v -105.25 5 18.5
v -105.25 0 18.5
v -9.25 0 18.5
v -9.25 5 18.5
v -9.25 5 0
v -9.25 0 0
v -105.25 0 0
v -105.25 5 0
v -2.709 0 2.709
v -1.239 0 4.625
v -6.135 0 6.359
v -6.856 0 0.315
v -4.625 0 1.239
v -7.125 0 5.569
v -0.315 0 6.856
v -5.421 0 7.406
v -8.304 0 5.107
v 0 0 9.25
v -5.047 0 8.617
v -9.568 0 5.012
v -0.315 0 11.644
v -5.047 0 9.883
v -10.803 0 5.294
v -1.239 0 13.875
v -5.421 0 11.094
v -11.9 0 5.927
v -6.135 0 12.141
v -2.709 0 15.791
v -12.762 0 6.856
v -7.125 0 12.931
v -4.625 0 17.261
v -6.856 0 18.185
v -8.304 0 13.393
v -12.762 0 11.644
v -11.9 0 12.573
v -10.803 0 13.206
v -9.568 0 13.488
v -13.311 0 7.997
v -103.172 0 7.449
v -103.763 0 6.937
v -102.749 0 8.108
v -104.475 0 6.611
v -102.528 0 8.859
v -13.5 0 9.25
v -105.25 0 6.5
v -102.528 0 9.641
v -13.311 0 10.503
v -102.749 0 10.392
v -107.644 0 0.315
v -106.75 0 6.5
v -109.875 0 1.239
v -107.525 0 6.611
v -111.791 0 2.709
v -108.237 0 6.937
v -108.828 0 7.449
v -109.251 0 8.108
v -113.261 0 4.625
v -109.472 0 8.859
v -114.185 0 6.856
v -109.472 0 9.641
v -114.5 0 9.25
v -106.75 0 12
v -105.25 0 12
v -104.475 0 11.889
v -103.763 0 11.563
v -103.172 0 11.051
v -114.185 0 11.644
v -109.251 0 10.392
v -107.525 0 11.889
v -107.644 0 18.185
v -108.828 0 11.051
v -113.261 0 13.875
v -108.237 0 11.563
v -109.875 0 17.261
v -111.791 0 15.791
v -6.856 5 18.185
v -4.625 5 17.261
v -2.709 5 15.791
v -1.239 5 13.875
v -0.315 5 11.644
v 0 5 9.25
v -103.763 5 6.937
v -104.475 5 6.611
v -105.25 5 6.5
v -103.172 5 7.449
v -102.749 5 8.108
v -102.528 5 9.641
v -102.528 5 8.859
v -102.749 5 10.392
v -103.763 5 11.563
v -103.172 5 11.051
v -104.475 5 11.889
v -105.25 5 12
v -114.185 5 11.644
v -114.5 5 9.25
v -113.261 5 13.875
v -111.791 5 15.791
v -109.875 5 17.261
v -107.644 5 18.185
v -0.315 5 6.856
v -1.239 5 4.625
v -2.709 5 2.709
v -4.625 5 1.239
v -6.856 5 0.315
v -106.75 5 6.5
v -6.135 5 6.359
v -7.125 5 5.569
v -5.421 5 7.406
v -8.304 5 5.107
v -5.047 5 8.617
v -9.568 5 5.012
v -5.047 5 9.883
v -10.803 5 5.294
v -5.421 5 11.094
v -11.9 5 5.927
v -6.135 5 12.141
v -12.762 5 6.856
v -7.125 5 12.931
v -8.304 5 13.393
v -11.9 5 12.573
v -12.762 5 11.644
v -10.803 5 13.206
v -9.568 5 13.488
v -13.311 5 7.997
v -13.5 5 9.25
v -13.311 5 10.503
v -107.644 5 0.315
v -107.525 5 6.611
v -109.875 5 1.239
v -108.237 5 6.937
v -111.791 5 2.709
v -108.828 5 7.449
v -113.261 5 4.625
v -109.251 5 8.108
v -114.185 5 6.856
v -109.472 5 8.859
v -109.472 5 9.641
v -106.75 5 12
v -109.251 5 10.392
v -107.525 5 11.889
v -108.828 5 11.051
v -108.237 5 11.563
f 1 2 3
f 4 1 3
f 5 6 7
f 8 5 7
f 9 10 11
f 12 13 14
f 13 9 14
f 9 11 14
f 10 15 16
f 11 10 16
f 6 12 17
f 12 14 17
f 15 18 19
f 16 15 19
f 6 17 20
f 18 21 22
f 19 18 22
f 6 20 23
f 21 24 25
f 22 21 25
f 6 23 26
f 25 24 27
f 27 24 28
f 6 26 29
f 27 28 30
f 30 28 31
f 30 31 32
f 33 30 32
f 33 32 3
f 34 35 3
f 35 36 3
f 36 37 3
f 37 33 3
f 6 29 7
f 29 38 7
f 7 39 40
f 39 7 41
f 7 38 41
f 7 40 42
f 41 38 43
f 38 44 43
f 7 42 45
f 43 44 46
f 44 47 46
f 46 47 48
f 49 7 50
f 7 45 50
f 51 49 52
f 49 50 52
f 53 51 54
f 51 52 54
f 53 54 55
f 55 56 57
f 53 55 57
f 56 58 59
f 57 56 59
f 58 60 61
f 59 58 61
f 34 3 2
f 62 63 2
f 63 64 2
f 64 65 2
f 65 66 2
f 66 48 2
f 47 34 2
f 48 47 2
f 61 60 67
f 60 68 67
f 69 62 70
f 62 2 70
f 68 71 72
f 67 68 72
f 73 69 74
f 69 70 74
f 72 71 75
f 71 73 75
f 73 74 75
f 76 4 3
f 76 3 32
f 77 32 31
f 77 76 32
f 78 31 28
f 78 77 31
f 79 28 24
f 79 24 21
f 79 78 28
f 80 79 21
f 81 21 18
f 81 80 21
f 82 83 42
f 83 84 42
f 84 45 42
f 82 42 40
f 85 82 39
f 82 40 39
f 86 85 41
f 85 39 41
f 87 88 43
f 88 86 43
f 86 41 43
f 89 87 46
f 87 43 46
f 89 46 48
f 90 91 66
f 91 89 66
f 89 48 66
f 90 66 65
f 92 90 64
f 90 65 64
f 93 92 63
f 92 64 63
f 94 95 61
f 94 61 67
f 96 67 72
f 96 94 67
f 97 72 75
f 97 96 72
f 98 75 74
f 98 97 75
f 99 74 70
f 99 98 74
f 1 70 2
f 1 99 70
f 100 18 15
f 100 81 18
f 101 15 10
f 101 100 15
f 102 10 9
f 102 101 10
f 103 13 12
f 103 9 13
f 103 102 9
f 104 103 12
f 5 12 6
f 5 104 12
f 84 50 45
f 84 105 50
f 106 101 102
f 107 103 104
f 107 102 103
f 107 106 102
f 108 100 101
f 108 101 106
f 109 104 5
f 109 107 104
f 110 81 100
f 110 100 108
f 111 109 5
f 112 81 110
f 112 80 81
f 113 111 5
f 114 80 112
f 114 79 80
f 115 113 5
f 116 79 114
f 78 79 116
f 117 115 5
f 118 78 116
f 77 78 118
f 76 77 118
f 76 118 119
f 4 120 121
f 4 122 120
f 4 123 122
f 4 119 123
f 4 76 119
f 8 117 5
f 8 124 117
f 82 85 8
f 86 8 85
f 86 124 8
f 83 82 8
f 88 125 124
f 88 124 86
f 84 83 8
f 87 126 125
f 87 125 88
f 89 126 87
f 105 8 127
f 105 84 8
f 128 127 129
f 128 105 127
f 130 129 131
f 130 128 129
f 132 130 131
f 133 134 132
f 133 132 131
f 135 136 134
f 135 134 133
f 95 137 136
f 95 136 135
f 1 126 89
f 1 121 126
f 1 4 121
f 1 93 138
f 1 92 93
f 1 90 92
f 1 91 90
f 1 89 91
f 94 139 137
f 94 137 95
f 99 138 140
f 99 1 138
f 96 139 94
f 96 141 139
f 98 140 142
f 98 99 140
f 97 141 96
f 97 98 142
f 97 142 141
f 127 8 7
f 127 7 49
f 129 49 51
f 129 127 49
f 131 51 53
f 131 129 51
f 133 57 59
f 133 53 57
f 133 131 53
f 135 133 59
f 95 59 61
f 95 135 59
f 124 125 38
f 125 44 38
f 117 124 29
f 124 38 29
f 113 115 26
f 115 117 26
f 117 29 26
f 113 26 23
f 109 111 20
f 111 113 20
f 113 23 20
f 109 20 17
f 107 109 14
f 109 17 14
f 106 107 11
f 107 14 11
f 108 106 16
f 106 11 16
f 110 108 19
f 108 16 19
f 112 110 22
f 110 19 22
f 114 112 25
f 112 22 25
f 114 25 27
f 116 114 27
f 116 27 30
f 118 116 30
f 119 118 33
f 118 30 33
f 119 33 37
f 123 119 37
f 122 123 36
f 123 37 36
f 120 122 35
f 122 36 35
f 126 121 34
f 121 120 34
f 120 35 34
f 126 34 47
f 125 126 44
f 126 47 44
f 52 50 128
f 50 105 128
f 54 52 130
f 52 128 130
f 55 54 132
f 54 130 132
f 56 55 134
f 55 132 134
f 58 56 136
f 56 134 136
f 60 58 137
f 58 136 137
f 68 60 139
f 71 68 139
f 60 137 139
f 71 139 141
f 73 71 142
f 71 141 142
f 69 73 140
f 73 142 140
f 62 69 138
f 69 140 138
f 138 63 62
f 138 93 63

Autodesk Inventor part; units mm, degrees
ref_plane "YZ Plane" through (0, 0, 0) normal (1, 0, 0) x (0, 1, 0)
ref_plane "XZ Plane" through (0, 0, 0) normal (0, 1, 0) x (-1, 0, 0)
ref_plane "XY Plane" through (0, 0, 0) normal (0, 0, 1) x (1, 0, 0)
sketch "Sketch1" plane through (0, 0, 0) normal (0, 1, 0) x (-1, 0, 0)
  line L0 (0, 0) -> (114.5, 0)
  line L1 (114.5, 0) -> (114.5, 18.5)
  line L2 (114.5, 18.5) -> (0, 18.5)
  line L3 (0, 18.5) -> (0, 0)
  circle A0 centre (105.25, 9.25) radius 2.75
  circle A1 centre (9.25, 9.25) radius 4.25
  dimension "d12" = 5.5
  dimension "d44" = 8.5
  dimension "d52" = 96
  dimension "d57" = 9.25
  dimension "d58" = 9.25
  dimension "d59" = 9.25
  dimension "d60" = 9.25
extrude "Extrusion3" add sketch "Sketch1" along normal blind 5
fillet "Fillet3" radius 9.25 1 edges at (-114.5, 2.5, 0)
fillet "Fillet4" radius 9.25 3 edges at (-114.5, 2.5, 18.5) (0, 2.5, 18.5) (0, 2.5, 0)
sketch "Sketch2" plane through (0, 0, 0) normal (0, -1, 0) x (1, 0, 0)
  point P0 (0, 0)
sketch "Sketch3" plane through (0, 5, 0) normal (0, 1, 0) x (1, 0, 0)
  circle A0 centre (-105.25, -9.25) radius 2.75 projected
  circle A1 centre (-106.75, -9.25) radius 2.75
  line L0 (-106.75, -6.5) -> (-105.25, -6.5)
  line L1 (-105.25, -12) -> (-106.75, -12)
  line L2 (-106.75, -6.5) -> (-105.25, -6.5)
  line L3 (-106.75, -12) -> (-105.25, -12)
  point P0 (0, 0)
  dimension "d62" = 5.5
  dimension "d64" = 1.5
extrude "Extrusion4" cut sketch "Sketch3" against normal blind 10 contours A0 A1 L0 | L1 A1 A0 | A0 A1 picked at (-108.9803, -9.1424)
properties part number "crankRod1"
